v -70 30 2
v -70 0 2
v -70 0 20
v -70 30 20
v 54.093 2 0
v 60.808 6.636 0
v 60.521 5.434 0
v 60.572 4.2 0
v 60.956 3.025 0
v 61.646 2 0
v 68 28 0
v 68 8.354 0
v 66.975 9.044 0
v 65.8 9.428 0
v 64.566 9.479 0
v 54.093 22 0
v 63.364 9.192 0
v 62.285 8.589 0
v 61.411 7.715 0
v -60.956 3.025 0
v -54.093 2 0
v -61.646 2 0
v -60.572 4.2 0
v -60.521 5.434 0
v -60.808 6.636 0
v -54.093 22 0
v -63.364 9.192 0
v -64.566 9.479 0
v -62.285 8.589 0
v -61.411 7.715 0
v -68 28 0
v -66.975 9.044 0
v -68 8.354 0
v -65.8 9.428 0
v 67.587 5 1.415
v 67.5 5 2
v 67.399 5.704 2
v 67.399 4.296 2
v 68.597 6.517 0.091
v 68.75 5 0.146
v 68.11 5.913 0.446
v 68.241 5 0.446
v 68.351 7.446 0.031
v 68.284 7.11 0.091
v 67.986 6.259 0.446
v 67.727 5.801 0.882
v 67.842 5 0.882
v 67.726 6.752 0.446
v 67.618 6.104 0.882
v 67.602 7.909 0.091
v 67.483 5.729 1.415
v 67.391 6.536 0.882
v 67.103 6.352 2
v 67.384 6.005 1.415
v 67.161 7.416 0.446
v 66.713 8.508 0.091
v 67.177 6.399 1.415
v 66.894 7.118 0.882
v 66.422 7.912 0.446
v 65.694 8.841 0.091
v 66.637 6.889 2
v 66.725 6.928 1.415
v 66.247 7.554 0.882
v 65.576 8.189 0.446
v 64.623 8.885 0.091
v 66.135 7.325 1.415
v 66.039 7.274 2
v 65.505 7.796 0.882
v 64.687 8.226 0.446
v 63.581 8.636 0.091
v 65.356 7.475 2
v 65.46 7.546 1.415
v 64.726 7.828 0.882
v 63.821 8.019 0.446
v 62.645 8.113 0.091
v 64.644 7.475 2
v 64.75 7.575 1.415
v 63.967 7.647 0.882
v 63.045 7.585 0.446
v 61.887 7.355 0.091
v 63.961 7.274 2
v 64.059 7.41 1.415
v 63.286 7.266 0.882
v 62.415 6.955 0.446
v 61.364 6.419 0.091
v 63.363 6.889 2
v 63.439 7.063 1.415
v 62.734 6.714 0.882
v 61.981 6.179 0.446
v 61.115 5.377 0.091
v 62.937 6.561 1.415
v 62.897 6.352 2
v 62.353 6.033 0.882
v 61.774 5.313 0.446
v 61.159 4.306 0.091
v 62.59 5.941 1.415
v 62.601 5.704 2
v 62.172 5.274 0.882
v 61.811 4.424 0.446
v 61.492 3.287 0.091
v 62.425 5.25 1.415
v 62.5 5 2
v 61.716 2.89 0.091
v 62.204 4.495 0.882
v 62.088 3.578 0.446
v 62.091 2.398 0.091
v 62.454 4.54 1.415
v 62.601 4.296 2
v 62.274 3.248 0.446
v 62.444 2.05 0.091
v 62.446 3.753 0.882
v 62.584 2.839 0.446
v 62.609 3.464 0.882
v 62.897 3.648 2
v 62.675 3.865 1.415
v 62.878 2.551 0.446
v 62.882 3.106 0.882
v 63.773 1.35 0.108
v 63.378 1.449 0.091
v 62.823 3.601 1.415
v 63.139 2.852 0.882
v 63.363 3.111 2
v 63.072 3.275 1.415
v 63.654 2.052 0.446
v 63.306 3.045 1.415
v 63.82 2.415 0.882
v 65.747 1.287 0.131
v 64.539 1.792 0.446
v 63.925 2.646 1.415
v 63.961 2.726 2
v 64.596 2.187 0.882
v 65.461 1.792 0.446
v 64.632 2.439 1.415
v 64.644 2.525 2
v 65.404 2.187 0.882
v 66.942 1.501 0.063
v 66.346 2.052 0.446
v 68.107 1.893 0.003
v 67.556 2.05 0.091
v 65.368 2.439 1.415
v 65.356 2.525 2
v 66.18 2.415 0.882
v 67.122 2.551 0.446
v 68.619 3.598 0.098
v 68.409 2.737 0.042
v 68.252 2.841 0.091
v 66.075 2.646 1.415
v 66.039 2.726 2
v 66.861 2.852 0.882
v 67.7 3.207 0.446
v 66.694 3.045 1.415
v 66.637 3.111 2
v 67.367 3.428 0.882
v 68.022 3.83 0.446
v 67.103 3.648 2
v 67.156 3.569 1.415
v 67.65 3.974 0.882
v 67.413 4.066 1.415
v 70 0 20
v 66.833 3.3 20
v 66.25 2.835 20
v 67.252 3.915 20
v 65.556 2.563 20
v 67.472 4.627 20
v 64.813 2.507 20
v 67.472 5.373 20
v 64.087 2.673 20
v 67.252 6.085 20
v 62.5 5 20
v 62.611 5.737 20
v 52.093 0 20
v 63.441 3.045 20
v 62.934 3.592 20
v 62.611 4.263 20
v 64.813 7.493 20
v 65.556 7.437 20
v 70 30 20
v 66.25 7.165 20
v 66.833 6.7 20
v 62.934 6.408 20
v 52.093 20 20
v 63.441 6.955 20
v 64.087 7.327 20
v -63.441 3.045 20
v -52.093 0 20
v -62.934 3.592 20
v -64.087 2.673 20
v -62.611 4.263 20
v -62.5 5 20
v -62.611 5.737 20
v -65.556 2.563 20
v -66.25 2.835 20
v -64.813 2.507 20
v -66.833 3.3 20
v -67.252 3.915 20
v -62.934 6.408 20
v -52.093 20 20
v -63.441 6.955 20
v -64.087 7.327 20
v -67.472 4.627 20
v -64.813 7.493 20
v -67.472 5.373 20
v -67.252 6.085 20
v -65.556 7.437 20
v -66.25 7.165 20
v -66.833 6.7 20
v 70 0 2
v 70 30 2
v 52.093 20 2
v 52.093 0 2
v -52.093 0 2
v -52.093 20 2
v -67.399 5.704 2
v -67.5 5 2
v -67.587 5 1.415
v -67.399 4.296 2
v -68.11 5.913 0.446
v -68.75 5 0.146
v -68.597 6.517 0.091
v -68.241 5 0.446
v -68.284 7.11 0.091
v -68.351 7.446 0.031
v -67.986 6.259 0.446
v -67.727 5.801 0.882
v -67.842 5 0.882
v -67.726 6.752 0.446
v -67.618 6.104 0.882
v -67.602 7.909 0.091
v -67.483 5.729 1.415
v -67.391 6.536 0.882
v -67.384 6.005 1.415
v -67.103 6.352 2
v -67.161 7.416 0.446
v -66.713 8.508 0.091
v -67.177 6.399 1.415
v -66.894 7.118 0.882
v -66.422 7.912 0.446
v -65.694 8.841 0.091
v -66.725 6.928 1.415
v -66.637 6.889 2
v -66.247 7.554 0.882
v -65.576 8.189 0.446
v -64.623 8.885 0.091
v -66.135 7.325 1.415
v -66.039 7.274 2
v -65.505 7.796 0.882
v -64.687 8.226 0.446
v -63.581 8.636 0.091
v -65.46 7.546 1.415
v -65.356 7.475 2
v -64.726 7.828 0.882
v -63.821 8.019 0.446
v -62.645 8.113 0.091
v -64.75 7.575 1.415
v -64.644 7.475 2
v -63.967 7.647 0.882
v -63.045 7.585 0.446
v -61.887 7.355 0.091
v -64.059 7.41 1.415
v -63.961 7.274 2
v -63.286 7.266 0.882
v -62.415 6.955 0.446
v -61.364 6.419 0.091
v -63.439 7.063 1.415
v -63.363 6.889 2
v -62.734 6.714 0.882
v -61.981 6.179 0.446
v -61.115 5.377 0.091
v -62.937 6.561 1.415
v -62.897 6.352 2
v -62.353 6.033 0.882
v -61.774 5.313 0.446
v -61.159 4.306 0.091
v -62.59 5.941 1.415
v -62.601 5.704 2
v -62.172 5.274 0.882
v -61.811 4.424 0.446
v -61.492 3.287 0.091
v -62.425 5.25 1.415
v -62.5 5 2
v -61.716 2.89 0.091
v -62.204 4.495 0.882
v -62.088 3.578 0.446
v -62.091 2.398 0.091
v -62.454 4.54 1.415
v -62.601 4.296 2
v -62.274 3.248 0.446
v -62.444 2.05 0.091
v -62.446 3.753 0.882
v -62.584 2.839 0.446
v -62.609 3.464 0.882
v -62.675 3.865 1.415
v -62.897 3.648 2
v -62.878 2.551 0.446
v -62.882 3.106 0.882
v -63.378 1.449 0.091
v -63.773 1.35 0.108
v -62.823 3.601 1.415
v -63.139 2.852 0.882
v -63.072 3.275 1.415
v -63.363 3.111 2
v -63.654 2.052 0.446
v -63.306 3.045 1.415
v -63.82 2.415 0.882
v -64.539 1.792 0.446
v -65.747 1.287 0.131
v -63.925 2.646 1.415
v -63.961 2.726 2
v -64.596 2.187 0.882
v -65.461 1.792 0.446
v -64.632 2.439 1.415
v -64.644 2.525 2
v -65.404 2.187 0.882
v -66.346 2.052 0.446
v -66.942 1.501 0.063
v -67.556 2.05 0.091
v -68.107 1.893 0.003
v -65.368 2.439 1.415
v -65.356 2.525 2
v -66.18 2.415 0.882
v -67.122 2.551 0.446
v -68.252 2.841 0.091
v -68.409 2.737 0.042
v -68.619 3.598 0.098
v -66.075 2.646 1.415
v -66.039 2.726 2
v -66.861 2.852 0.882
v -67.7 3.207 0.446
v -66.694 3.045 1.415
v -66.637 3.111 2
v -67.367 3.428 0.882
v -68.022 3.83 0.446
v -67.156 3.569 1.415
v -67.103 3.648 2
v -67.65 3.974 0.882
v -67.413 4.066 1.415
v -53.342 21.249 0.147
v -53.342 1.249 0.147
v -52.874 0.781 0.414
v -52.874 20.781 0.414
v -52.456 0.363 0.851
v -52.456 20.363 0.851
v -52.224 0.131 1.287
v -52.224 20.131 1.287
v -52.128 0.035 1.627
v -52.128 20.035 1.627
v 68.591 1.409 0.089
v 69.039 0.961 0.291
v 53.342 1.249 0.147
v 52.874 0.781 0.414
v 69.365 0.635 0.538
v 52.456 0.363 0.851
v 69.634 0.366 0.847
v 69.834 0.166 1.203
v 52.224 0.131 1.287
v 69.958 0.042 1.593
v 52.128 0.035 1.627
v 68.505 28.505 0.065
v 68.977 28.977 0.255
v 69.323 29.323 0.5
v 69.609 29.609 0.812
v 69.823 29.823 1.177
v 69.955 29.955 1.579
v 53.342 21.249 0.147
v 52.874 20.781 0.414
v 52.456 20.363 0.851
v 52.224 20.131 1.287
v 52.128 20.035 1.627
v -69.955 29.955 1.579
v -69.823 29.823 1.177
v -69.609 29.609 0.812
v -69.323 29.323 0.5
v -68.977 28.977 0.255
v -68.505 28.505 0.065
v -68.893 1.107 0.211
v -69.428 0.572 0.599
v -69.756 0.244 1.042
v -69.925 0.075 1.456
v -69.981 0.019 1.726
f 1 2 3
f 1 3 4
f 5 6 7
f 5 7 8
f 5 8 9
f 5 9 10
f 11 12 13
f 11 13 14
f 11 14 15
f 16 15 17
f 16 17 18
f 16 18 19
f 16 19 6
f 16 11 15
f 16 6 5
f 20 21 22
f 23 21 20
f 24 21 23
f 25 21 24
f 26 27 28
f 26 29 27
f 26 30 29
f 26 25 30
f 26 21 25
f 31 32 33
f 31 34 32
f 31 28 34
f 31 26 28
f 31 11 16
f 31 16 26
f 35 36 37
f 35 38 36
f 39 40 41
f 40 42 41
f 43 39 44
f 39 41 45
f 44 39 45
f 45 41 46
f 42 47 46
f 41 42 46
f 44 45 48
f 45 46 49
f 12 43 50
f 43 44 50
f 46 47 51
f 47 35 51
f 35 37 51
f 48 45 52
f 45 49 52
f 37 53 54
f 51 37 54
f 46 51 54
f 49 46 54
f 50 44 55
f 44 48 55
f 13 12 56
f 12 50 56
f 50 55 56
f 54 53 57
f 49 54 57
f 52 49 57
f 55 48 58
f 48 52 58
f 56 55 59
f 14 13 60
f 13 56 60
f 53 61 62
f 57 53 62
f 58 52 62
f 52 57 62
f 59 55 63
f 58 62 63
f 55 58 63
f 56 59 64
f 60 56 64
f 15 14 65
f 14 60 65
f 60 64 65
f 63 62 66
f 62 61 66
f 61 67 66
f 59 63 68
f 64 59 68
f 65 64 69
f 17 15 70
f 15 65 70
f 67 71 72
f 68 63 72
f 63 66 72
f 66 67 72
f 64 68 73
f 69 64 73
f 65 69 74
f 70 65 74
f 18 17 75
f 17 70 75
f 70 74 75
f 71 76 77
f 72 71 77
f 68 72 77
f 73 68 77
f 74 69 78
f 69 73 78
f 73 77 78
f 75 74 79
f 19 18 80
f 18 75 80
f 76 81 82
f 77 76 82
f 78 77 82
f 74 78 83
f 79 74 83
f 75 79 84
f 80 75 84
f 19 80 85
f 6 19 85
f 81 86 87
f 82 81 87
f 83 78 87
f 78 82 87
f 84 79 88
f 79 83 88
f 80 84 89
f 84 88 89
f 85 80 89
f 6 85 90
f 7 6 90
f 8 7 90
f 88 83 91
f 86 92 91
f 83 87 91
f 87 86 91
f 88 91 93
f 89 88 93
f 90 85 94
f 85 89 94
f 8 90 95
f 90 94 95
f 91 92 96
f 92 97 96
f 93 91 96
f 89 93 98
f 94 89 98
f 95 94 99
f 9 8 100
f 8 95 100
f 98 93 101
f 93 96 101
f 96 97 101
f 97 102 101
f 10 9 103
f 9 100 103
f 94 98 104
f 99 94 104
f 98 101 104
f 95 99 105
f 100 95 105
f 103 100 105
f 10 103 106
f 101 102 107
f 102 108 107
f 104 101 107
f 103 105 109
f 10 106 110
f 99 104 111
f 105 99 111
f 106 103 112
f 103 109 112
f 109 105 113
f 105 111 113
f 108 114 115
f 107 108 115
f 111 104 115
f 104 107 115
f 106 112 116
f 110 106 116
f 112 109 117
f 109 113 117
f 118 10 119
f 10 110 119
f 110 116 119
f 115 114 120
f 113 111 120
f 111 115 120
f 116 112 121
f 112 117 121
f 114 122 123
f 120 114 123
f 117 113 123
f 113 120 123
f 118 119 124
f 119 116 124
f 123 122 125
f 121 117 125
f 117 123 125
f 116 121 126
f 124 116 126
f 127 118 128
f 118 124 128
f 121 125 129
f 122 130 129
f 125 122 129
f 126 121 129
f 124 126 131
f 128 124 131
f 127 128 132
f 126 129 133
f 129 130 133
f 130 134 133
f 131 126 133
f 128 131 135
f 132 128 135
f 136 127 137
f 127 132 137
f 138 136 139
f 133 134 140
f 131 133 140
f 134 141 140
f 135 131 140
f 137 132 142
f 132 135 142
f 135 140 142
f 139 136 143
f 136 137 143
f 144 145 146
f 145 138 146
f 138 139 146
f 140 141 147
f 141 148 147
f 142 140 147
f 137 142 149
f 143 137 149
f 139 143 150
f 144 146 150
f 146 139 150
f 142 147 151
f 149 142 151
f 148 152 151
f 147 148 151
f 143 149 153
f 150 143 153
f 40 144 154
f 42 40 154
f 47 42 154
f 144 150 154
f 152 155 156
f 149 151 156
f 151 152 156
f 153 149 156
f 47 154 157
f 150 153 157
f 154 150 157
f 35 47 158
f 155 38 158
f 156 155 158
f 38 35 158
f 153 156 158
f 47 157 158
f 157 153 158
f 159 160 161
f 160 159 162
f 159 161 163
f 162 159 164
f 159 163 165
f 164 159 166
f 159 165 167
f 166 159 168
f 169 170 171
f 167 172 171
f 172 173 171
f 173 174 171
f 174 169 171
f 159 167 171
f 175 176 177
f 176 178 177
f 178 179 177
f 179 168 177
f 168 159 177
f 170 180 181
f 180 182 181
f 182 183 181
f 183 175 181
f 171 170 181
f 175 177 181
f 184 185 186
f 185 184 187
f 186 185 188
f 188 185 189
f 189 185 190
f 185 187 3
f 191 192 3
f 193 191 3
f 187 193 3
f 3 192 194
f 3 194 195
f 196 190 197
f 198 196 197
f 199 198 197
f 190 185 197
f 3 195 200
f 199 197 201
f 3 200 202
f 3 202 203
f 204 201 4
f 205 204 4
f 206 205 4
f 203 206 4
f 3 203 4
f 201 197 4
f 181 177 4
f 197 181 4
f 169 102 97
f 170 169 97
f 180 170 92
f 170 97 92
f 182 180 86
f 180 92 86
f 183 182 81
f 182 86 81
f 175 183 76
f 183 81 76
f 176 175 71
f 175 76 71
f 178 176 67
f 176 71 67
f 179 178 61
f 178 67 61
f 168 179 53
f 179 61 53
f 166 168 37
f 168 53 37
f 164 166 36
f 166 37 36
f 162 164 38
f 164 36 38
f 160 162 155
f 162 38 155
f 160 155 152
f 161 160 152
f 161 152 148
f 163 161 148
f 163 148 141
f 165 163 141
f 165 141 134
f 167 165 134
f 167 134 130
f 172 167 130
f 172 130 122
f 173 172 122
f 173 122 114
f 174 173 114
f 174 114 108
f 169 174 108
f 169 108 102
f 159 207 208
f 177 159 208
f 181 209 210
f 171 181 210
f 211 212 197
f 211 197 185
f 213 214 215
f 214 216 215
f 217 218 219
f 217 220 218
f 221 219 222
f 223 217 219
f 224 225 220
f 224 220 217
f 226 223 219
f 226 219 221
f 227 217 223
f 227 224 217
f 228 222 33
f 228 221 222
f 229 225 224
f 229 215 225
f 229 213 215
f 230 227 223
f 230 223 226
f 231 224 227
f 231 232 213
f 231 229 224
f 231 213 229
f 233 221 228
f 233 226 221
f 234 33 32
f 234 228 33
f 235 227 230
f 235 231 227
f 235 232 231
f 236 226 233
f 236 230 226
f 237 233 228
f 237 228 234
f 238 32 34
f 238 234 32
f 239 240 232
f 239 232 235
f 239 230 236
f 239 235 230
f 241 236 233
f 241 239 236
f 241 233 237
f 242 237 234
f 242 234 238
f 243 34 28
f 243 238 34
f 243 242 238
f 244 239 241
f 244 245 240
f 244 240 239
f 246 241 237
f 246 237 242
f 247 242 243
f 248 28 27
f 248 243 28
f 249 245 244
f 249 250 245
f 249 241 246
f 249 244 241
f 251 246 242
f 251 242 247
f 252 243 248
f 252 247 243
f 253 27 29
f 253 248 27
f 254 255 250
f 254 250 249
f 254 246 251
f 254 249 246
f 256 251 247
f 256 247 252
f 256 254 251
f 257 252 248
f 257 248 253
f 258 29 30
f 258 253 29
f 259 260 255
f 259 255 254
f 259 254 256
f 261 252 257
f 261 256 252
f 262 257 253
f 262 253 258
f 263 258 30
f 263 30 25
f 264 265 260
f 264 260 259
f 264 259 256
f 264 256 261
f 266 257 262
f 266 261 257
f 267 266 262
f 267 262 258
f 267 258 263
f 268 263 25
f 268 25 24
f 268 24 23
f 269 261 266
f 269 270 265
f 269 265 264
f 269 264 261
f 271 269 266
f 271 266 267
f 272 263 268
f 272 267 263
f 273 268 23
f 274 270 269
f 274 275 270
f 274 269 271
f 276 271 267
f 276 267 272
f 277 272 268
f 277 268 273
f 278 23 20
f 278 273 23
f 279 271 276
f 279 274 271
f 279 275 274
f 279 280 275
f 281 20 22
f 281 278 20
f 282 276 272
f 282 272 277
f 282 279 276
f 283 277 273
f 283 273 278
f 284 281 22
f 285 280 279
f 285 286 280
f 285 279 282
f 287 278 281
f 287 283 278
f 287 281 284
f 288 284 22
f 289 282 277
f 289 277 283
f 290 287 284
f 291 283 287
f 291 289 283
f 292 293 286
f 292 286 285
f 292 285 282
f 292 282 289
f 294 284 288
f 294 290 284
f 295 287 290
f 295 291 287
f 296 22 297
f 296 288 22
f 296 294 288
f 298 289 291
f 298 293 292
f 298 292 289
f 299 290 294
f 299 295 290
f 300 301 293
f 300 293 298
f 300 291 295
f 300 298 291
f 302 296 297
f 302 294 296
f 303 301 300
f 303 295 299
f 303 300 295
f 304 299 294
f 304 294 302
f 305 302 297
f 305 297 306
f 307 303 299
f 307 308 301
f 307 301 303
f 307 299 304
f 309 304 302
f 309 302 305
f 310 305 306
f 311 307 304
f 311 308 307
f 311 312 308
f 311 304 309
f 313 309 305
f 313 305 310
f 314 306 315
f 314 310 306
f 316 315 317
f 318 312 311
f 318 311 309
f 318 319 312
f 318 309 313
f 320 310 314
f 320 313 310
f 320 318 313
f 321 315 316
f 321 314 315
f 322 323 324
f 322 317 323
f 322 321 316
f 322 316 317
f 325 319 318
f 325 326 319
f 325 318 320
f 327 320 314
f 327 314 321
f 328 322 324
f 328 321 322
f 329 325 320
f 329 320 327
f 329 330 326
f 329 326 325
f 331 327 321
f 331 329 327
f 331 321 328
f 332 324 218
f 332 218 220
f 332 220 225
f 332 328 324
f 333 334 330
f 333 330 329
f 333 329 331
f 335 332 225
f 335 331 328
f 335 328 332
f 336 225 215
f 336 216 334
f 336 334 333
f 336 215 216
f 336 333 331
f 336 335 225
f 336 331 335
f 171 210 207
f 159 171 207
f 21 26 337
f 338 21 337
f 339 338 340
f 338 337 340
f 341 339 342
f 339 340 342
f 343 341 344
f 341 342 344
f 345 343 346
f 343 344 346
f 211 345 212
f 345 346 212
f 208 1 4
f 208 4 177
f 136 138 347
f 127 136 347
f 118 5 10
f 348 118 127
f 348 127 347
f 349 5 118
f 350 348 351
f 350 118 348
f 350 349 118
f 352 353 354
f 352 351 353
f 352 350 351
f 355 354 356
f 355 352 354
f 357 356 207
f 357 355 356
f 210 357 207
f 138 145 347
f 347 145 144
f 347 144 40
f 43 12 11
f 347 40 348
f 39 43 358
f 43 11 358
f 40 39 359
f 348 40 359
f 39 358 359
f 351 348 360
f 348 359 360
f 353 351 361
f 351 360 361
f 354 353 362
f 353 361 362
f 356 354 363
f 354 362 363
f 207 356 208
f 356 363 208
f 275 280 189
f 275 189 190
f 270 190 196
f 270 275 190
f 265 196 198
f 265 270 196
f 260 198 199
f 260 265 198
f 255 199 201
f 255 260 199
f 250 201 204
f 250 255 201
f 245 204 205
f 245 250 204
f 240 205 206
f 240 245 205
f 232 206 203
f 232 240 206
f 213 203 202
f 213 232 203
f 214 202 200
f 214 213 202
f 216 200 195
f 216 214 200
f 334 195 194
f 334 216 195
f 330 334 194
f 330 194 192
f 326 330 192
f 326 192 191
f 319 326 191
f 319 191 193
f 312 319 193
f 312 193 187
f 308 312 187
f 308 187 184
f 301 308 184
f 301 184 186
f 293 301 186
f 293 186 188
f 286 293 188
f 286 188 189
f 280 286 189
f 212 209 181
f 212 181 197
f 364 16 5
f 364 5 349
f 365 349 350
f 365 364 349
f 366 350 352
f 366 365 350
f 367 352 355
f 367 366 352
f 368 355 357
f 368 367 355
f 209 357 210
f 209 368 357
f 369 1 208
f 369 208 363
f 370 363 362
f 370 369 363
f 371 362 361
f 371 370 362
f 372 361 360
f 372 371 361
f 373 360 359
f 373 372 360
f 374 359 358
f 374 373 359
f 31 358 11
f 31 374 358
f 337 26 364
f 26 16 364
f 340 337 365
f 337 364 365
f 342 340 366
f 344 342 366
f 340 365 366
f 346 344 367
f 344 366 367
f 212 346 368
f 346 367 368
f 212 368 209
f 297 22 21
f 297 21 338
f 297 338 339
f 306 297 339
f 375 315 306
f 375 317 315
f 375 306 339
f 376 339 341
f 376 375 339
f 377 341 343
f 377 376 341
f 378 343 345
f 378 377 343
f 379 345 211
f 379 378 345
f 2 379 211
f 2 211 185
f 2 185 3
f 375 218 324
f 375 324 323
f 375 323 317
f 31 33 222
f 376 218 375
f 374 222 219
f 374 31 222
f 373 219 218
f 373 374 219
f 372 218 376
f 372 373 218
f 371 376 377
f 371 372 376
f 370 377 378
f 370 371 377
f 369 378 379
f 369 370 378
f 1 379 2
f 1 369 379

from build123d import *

# Parameters (mm, degrees)
F1_DEPTH     = 20
F3_D         = 5
F5_T1_DEPTH  = 150
F5_T3_DEPTH  = 40
F5_T5_DEPTH  = 27.906979831
F5_T7_DEPTH  = 25
F5_T9_DEPTH  = 104.186040338
F5_T11_DEPTH = 27.906979831
F5_T21_DEPTH = 30
F5_T25_DEPTH = 109.186040338
F5_T32_DEPTH = 109.186040338
F5_T36_DEPTH = 30


# Not quite as in the source:
# - a fillet or chamfer that OpenCascade refuses, or shapes differently, is made with other operations: its cross-section is extruded or revolved along the edge and cut away or added


with BuildPart() as f1:
    # F0 (on Top) → F1 (new body)
    with BuildSketch(Plane.XY):
        Polygon((70, 30), (0, 30), (0, 20), (52.093020169, 20), (52.093020169, 0), (70, 0), align=None)
    extrude(amount=F1_DEPTH)

    # F3 (through all)
    with Locations(Plane.XY.offset(20)):
        with Locations((65, 5)):
            Hole(F3_D / 2)

    # F4: F1 across face


with BuildPart() as f1_1:
    add(f1.part)
    add(f1.part.mirror(Plane(origin=(0, 25, 10), x_dir=(0, -1, 0), z_dir=(-1, 0, 0))))

    # F5: fillet of radius 2 on 10 edges, made by hand

    # F5_s2 → F5_t1 (cut)
    with BuildSketch(Plane.YZ.offset(-75)):
        with BuildLine():
            ThreePointArc((30, 2), (29.4142135624, 0.5857864376), (28, 0))
            Line((28, 0), (30, 0))
            Line((30, 0), (30, 2))
        make_face()
    extrude(amount=F5_T1_DEPTH, mode=Mode.SUBTRACT)

    # F5_s4 → F5_t3 (cut)
    with BuildSketch(Plane.XZ.offset(-35)):
        with BuildLine():
            ThreePointArc((-68, 0), (-69.4142135624, 0.5857864376), (-70, 2))
            Line((-70, 2), (-70, 0))
            Line((-70, 0), (-68, 0))
        make_face()
        with BuildLine():
            ThreePointArc((68, 0), (69.4142135624, 0.5857864376), (70, 2))
            Line((70, 2), (70, 0))
            Line((70, 0), (68, 0))
        make_face()
    extrude(amount=F5_T3_DEPTH, mode=Mode.SUBTRACT)

    # F5_s6 → F5_t5 (cut)
    with BuildSketch(Plane.YZ.offset(-75)):
        with BuildLine():
            ThreePointArc((2, 0), (0.5857864376, 0.5857864376), (0, 2))
            Line((0, 2), (0, 0))
            Line((0, 0), (2, 0))
        make_face()
    extrude(amount=F5_T5_DEPTH, mode=Mode.SUBTRACT)

    # F5_s8 → F5_t7 (cut)
    with BuildSketch(Plane.XZ.offset(-20)):
        with BuildLine():
            ThreePointArc((-54.093020169, 0), (-52.6788066067, 0.5857864376), (-52.093020169, 2))
            Line((-52.093020169, 2), (-52.093020169, 0))
            Line((-52.093020169, 0), (-54.093020169, 0))
        make_face()
        with BuildLine():
            ThreePointArc((54.093020169, 0), (52.6788066067, 0.5857864376), (52.093020169, 2))
            Line((52.093020169, 2), (52.093020169, 0))
            Line((52.093020169, 0), (54.093020169, 0))
        make_face()
    extrude(amount=F5_T7_DEPTH, mode=Mode.SUBTRACT)

    # F5_s10 → F5_t9 (cut)
    with BuildSketch(Plane.YZ.offset(-52.093020169)):
        with BuildLine():
            ThreePointArc((22, 0), (20.5857864376, 0.5857864376), (20, 2))
            Line((20, 2), (20, 0))
            Line((20, 0), (22, 0))
        make_face()
    extrude(amount=F5_T9_DEPTH, mode=Mode.SUBTRACT)

    # F5_s12 → F5_t11 (cut)
    with BuildSketch(Plane.YZ.offset(47.093020169)):
        with BuildLine():
            ThreePointArc((2, 0), (0.5857864376, 0.5857864376), (0, 2))
            Line((0, 2), (0, 0))
            Line((0, 0), (2, 0))
        make_face()
    extrude(amount=F5_T11_DEPTH, mode=Mode.SUBTRACT)

    # F5_s13 → F5_t14 (revolve, cut)
    with BuildSketch(Plane.XZ.offset(-5)):
        with BuildLine():
            ThreePointArc((69.5, 0), (68.0857864376, 0.5857864376), (67.5, 2))
            Line((67.5, 2), (67.5, 0))
            Line((67.5, 0), (69.5, 0))
        make_face()
    revolve(axis=Axis((65, 5, 0), (0, 0, 1)), mode=Mode.SUBTRACT)

    # F5_s15 → F5_t16 (revolve, cut)
    with BuildSketch(Plane.XZ.offset(-5)):
        with BuildLine():
            ThreePointArc((-69.5, 0), (-68.0857864376, 0.5857864376), (-67.5, 2))
            Line((-67.5, 2), (-67.5, 0))
            Line((-67.5, 0), (-69.5, 0))
        make_face()
    revolve(axis=Axis((-65, 5, 0), (0, 0, -1)), mode=Mode.SUBTRACT)


with BuildPart() as f5_tool19:
    # F5_s20 → F5_t21 (new body)
    with BuildSketch(Plane.XZ.offset(-25)):
        with BuildLine():
            ThreePointArc((-54.093020169, 0), (-52.6788066067, 0.5857864376), (-52.093020169, 2))
            Line((-52.093020169, 2), (-52.093020169, 0))
            Line((-52.093020169, 0), (-54.093020169, 0))
        make_face()
    extrude(amount=F5_T21_DEPTH)

    split(bisect_by=Plane.XZ.offset(-20), keep=Keep.BOTTOM)


with BuildPart() as f5_tool23:
    # F5_s24 → F5_t25 (new body)
    with BuildSketch(Plane.YZ.offset(52.093020169)):
        with BuildLine():
            ThreePointArc((22, 0), (20.5857864376, 0.5857864376), (20, 2))
            Line((20, 2), (20, 0))
            Line((20, 0), (22, 0))
        make_face()
    extrude(amount=-F5_T25_DEPTH)

    split(bisect_by=Plane.YZ.offset(-52.093020169), keep=Keep.BOTTOM)


with BuildPart() as f5_tool19_1:
    add(f5_tool19.part)

    # F5_t27: intersect F5_tool23
    add(f5_tool23.part, mode=Mode.INTERSECT)


with BuildPart() as f1_2:
    add(f1_1.part)

    # F5_t17: cut F5_tool19
    add(f5_tool19_1.part, mode=Mode.SUBTRACT)


with BuildPart() as f5_tool30:
    # F5_s31 → F5_t32 (new body)
    with BuildSketch(Plane.YZ.offset(57.093020169)):
        with BuildLine():
            ThreePointArc((22, 0), (20.5857864376, 0.5857864376), (20, 2))
            Line((20, 2), (20, 0))
            Line((20, 0), (22, 0))
        make_face()
    extrude(amount=-F5_T32_DEPTH)

    split(bisect_by=Plane.YZ.offset(52.093020169), keep=Keep.TOP)


with BuildPart() as f5_tool34:
    # F5_s35 → F5_t36 (new body)
    with BuildSketch(Plane.XZ.offset(-25)):
        with BuildLine():
            ThreePointArc((54.093020169, 0), (52.6788066067, 0.5857864376), (52.093020169, 2))
            Line((52.093020169, 2), (52.093020169, 0))
            Line((52.093020169, 0), (54.093020169, 0))
        make_face()
    extrude(amount=F5_T36_DEPTH)

    split(bisect_by=Plane.XZ.offset(-20), keep=Keep.BOTTOM)


with BuildPart() as f5_tool30_1:
    add(f5_tool30.part)

    # F5_t38: intersect F5_tool34
    add(f5_tool34.part, mode=Mode.INTERSECT)


with BuildPart() as f1_3:
    add(f1_2.part)

    # F5_t28: cut F5_tool30
    add(f5_tool30_1.part, mode=Mode.SUBTRACT)


solid = f1_3.part
